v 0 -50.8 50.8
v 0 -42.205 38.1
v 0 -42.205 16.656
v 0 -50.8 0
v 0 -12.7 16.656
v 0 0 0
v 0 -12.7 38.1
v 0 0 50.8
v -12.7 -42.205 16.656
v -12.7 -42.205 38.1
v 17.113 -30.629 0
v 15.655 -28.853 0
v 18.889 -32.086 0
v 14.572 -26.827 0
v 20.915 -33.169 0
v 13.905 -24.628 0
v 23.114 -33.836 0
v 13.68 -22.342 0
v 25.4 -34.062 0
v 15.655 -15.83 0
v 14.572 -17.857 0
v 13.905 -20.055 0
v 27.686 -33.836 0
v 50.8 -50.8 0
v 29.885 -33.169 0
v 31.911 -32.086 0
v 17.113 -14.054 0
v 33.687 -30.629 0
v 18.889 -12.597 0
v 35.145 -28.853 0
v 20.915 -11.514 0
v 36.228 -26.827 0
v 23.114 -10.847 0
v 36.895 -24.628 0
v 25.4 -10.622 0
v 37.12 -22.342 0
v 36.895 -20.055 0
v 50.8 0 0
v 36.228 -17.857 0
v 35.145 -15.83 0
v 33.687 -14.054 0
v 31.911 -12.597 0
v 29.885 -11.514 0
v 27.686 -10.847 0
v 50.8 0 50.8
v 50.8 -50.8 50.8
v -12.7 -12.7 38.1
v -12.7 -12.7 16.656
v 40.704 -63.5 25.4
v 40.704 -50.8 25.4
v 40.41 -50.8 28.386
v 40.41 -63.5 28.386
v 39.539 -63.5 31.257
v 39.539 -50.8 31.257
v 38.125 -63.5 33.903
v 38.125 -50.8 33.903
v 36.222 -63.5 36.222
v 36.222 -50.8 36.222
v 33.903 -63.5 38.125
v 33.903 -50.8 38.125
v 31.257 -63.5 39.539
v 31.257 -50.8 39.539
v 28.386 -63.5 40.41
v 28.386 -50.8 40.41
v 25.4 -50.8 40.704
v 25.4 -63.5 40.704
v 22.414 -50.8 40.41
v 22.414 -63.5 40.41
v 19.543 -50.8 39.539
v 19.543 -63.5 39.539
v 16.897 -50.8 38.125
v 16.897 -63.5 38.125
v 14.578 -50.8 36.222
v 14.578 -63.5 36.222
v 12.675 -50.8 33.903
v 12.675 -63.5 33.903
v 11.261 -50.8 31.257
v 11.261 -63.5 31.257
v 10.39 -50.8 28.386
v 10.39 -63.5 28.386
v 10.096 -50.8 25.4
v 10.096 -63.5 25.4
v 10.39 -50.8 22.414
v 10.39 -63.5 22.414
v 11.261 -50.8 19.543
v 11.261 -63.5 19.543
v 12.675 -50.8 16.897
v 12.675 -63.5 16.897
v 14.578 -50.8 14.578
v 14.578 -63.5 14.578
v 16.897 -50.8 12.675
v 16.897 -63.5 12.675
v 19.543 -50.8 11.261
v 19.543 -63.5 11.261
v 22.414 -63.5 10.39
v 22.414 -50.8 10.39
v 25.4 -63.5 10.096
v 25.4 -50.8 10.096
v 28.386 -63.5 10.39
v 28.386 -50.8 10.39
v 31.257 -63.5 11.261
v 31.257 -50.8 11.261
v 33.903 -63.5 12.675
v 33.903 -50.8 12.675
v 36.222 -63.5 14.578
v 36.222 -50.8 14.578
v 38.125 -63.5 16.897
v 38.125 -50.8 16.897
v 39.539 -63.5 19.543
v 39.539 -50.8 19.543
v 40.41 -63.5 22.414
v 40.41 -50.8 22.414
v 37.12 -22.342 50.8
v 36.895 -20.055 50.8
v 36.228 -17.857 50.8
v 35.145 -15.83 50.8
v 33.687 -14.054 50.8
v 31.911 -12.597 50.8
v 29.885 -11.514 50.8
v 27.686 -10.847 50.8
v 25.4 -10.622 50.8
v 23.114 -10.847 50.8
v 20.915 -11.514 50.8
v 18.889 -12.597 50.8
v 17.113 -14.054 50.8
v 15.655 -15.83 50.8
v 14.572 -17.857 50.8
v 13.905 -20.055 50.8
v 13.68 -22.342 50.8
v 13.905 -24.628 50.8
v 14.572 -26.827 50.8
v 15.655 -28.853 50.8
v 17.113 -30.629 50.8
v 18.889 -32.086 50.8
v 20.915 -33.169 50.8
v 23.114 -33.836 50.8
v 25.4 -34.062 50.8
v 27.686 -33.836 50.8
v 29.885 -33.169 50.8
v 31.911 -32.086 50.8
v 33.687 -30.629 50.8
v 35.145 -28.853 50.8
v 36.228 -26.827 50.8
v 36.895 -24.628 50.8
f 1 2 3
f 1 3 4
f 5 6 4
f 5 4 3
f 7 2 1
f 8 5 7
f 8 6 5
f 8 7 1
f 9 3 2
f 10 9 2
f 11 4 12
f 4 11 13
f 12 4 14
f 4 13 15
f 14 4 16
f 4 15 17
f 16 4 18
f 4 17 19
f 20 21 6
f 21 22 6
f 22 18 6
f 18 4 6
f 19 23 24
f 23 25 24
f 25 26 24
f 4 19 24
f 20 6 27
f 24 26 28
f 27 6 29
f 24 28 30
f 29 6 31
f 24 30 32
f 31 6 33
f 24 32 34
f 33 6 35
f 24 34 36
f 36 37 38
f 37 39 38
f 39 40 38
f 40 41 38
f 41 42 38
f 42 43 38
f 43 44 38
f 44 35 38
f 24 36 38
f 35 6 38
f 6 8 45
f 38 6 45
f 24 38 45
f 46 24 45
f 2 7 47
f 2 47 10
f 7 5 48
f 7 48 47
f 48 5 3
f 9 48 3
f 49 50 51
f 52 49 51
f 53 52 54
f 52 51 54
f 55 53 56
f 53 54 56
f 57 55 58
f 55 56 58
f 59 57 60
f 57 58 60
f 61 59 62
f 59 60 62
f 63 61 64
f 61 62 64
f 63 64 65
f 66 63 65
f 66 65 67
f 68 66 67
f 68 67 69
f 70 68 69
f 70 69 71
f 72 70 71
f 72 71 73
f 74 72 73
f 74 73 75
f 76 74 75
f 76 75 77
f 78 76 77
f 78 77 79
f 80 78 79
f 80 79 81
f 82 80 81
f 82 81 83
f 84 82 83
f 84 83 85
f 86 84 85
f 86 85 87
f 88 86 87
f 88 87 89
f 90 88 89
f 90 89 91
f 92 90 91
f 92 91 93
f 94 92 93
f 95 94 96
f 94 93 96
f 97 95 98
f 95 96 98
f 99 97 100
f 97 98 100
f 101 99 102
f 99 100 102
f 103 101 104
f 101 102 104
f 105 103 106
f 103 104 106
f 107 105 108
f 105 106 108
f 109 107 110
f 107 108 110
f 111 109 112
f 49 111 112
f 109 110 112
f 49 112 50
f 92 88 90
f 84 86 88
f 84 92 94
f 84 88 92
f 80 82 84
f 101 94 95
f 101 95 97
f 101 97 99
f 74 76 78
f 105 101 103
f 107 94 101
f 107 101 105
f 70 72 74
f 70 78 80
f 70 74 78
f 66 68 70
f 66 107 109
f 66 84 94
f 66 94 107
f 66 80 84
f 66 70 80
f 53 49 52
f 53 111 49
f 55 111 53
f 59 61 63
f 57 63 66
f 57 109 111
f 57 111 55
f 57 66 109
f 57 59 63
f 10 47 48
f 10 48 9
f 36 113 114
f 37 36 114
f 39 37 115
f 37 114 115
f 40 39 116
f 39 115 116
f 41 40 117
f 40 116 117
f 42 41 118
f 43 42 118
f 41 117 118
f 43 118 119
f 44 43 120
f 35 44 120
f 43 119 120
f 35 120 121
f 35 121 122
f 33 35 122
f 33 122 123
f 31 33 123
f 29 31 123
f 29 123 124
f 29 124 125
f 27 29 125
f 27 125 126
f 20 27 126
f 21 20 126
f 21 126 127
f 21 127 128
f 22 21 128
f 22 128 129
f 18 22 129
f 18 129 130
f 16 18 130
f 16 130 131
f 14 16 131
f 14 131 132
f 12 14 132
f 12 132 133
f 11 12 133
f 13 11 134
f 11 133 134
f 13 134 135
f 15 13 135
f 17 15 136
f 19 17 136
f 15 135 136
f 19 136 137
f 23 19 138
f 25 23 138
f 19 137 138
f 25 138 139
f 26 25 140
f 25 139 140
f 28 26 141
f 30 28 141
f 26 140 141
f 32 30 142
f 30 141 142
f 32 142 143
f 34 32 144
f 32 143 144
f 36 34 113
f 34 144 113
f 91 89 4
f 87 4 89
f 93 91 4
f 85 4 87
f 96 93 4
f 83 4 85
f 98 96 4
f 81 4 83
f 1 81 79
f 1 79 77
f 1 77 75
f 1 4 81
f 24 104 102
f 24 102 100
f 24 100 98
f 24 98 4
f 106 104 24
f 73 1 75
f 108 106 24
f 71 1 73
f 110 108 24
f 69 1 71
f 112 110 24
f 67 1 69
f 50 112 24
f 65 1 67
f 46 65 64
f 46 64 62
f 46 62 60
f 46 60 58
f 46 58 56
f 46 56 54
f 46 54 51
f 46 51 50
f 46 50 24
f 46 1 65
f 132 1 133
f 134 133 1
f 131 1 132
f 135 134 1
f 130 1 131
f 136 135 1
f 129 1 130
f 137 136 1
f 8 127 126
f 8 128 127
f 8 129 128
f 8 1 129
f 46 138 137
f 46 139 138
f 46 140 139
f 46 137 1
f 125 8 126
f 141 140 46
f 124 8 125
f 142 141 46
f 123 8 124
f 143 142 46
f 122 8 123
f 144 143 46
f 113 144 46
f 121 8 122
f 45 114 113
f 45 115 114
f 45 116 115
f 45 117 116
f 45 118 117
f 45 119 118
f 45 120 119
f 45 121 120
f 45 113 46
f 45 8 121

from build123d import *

# Parameters (mm, degrees)
F0_W          = 50.8
F0_H          = 50.8
F0_R          = 15.3727399922
F1_DEPTH      = 50.8
F2_R          = 15.3041702045
F3_DEPTH      = 63.5
F4_W          = 29.5049050776
F4_H          = 21.4435977895
F5_DEPTH      = 12.7
F6_R          = 11.7198726016
F7_DEPTH      = 2540
F7_DEPTH_BACK = 25.4


with BuildPart() as f1:
    # F0 (on Front) → F1 (new body)
    with BuildSketch(Plane.XZ):
        with Locations((25.4, 25.4)):
            Rectangle(F0_W, F0_H)
        with Locations((25.4, 25.4)):
            Circle(F0_R, mode=Mode.SUBTRACT)
        with Locations((25.4, 25.4)):
            Circle(F0_R)
    extrude(amount=F1_DEPTH)

    # F2 (on Front) → F3 (join)
    with BuildSketch(Plane.XZ):
        with Locations((25.4, 25.4)):
            Circle(F2_R)
    extrude(amount=F3_DEPTH)

    # F4 (on face) → F5 (join)
    with BuildSketch(Plane(origin=(0, 0, 0), x_dir=(0, -1, 0), z_dir=(-1, 0, 0))):
        with Locations((27.4524525388, 27.3782011052)):
            Rectangle(F4_W, F4_H)
    extrude(amount=F5_DEPTH)

    # F6 (on face) → F7 (cut, two sides)
    with BuildSketch(Plane.XY.offset(50.8)) as f7_sk:
        with Locations((25.4, -22.3416946828)):
            Circle(F6_R)
    extrude(amount=-F7_DEPTH, mode=Mode.SUBTRACT)
    extrude(f7_sk.sketch, amount=F7_DEPTH_BACK, mode=Mode.SUBTRACT)


solid = f1.part
